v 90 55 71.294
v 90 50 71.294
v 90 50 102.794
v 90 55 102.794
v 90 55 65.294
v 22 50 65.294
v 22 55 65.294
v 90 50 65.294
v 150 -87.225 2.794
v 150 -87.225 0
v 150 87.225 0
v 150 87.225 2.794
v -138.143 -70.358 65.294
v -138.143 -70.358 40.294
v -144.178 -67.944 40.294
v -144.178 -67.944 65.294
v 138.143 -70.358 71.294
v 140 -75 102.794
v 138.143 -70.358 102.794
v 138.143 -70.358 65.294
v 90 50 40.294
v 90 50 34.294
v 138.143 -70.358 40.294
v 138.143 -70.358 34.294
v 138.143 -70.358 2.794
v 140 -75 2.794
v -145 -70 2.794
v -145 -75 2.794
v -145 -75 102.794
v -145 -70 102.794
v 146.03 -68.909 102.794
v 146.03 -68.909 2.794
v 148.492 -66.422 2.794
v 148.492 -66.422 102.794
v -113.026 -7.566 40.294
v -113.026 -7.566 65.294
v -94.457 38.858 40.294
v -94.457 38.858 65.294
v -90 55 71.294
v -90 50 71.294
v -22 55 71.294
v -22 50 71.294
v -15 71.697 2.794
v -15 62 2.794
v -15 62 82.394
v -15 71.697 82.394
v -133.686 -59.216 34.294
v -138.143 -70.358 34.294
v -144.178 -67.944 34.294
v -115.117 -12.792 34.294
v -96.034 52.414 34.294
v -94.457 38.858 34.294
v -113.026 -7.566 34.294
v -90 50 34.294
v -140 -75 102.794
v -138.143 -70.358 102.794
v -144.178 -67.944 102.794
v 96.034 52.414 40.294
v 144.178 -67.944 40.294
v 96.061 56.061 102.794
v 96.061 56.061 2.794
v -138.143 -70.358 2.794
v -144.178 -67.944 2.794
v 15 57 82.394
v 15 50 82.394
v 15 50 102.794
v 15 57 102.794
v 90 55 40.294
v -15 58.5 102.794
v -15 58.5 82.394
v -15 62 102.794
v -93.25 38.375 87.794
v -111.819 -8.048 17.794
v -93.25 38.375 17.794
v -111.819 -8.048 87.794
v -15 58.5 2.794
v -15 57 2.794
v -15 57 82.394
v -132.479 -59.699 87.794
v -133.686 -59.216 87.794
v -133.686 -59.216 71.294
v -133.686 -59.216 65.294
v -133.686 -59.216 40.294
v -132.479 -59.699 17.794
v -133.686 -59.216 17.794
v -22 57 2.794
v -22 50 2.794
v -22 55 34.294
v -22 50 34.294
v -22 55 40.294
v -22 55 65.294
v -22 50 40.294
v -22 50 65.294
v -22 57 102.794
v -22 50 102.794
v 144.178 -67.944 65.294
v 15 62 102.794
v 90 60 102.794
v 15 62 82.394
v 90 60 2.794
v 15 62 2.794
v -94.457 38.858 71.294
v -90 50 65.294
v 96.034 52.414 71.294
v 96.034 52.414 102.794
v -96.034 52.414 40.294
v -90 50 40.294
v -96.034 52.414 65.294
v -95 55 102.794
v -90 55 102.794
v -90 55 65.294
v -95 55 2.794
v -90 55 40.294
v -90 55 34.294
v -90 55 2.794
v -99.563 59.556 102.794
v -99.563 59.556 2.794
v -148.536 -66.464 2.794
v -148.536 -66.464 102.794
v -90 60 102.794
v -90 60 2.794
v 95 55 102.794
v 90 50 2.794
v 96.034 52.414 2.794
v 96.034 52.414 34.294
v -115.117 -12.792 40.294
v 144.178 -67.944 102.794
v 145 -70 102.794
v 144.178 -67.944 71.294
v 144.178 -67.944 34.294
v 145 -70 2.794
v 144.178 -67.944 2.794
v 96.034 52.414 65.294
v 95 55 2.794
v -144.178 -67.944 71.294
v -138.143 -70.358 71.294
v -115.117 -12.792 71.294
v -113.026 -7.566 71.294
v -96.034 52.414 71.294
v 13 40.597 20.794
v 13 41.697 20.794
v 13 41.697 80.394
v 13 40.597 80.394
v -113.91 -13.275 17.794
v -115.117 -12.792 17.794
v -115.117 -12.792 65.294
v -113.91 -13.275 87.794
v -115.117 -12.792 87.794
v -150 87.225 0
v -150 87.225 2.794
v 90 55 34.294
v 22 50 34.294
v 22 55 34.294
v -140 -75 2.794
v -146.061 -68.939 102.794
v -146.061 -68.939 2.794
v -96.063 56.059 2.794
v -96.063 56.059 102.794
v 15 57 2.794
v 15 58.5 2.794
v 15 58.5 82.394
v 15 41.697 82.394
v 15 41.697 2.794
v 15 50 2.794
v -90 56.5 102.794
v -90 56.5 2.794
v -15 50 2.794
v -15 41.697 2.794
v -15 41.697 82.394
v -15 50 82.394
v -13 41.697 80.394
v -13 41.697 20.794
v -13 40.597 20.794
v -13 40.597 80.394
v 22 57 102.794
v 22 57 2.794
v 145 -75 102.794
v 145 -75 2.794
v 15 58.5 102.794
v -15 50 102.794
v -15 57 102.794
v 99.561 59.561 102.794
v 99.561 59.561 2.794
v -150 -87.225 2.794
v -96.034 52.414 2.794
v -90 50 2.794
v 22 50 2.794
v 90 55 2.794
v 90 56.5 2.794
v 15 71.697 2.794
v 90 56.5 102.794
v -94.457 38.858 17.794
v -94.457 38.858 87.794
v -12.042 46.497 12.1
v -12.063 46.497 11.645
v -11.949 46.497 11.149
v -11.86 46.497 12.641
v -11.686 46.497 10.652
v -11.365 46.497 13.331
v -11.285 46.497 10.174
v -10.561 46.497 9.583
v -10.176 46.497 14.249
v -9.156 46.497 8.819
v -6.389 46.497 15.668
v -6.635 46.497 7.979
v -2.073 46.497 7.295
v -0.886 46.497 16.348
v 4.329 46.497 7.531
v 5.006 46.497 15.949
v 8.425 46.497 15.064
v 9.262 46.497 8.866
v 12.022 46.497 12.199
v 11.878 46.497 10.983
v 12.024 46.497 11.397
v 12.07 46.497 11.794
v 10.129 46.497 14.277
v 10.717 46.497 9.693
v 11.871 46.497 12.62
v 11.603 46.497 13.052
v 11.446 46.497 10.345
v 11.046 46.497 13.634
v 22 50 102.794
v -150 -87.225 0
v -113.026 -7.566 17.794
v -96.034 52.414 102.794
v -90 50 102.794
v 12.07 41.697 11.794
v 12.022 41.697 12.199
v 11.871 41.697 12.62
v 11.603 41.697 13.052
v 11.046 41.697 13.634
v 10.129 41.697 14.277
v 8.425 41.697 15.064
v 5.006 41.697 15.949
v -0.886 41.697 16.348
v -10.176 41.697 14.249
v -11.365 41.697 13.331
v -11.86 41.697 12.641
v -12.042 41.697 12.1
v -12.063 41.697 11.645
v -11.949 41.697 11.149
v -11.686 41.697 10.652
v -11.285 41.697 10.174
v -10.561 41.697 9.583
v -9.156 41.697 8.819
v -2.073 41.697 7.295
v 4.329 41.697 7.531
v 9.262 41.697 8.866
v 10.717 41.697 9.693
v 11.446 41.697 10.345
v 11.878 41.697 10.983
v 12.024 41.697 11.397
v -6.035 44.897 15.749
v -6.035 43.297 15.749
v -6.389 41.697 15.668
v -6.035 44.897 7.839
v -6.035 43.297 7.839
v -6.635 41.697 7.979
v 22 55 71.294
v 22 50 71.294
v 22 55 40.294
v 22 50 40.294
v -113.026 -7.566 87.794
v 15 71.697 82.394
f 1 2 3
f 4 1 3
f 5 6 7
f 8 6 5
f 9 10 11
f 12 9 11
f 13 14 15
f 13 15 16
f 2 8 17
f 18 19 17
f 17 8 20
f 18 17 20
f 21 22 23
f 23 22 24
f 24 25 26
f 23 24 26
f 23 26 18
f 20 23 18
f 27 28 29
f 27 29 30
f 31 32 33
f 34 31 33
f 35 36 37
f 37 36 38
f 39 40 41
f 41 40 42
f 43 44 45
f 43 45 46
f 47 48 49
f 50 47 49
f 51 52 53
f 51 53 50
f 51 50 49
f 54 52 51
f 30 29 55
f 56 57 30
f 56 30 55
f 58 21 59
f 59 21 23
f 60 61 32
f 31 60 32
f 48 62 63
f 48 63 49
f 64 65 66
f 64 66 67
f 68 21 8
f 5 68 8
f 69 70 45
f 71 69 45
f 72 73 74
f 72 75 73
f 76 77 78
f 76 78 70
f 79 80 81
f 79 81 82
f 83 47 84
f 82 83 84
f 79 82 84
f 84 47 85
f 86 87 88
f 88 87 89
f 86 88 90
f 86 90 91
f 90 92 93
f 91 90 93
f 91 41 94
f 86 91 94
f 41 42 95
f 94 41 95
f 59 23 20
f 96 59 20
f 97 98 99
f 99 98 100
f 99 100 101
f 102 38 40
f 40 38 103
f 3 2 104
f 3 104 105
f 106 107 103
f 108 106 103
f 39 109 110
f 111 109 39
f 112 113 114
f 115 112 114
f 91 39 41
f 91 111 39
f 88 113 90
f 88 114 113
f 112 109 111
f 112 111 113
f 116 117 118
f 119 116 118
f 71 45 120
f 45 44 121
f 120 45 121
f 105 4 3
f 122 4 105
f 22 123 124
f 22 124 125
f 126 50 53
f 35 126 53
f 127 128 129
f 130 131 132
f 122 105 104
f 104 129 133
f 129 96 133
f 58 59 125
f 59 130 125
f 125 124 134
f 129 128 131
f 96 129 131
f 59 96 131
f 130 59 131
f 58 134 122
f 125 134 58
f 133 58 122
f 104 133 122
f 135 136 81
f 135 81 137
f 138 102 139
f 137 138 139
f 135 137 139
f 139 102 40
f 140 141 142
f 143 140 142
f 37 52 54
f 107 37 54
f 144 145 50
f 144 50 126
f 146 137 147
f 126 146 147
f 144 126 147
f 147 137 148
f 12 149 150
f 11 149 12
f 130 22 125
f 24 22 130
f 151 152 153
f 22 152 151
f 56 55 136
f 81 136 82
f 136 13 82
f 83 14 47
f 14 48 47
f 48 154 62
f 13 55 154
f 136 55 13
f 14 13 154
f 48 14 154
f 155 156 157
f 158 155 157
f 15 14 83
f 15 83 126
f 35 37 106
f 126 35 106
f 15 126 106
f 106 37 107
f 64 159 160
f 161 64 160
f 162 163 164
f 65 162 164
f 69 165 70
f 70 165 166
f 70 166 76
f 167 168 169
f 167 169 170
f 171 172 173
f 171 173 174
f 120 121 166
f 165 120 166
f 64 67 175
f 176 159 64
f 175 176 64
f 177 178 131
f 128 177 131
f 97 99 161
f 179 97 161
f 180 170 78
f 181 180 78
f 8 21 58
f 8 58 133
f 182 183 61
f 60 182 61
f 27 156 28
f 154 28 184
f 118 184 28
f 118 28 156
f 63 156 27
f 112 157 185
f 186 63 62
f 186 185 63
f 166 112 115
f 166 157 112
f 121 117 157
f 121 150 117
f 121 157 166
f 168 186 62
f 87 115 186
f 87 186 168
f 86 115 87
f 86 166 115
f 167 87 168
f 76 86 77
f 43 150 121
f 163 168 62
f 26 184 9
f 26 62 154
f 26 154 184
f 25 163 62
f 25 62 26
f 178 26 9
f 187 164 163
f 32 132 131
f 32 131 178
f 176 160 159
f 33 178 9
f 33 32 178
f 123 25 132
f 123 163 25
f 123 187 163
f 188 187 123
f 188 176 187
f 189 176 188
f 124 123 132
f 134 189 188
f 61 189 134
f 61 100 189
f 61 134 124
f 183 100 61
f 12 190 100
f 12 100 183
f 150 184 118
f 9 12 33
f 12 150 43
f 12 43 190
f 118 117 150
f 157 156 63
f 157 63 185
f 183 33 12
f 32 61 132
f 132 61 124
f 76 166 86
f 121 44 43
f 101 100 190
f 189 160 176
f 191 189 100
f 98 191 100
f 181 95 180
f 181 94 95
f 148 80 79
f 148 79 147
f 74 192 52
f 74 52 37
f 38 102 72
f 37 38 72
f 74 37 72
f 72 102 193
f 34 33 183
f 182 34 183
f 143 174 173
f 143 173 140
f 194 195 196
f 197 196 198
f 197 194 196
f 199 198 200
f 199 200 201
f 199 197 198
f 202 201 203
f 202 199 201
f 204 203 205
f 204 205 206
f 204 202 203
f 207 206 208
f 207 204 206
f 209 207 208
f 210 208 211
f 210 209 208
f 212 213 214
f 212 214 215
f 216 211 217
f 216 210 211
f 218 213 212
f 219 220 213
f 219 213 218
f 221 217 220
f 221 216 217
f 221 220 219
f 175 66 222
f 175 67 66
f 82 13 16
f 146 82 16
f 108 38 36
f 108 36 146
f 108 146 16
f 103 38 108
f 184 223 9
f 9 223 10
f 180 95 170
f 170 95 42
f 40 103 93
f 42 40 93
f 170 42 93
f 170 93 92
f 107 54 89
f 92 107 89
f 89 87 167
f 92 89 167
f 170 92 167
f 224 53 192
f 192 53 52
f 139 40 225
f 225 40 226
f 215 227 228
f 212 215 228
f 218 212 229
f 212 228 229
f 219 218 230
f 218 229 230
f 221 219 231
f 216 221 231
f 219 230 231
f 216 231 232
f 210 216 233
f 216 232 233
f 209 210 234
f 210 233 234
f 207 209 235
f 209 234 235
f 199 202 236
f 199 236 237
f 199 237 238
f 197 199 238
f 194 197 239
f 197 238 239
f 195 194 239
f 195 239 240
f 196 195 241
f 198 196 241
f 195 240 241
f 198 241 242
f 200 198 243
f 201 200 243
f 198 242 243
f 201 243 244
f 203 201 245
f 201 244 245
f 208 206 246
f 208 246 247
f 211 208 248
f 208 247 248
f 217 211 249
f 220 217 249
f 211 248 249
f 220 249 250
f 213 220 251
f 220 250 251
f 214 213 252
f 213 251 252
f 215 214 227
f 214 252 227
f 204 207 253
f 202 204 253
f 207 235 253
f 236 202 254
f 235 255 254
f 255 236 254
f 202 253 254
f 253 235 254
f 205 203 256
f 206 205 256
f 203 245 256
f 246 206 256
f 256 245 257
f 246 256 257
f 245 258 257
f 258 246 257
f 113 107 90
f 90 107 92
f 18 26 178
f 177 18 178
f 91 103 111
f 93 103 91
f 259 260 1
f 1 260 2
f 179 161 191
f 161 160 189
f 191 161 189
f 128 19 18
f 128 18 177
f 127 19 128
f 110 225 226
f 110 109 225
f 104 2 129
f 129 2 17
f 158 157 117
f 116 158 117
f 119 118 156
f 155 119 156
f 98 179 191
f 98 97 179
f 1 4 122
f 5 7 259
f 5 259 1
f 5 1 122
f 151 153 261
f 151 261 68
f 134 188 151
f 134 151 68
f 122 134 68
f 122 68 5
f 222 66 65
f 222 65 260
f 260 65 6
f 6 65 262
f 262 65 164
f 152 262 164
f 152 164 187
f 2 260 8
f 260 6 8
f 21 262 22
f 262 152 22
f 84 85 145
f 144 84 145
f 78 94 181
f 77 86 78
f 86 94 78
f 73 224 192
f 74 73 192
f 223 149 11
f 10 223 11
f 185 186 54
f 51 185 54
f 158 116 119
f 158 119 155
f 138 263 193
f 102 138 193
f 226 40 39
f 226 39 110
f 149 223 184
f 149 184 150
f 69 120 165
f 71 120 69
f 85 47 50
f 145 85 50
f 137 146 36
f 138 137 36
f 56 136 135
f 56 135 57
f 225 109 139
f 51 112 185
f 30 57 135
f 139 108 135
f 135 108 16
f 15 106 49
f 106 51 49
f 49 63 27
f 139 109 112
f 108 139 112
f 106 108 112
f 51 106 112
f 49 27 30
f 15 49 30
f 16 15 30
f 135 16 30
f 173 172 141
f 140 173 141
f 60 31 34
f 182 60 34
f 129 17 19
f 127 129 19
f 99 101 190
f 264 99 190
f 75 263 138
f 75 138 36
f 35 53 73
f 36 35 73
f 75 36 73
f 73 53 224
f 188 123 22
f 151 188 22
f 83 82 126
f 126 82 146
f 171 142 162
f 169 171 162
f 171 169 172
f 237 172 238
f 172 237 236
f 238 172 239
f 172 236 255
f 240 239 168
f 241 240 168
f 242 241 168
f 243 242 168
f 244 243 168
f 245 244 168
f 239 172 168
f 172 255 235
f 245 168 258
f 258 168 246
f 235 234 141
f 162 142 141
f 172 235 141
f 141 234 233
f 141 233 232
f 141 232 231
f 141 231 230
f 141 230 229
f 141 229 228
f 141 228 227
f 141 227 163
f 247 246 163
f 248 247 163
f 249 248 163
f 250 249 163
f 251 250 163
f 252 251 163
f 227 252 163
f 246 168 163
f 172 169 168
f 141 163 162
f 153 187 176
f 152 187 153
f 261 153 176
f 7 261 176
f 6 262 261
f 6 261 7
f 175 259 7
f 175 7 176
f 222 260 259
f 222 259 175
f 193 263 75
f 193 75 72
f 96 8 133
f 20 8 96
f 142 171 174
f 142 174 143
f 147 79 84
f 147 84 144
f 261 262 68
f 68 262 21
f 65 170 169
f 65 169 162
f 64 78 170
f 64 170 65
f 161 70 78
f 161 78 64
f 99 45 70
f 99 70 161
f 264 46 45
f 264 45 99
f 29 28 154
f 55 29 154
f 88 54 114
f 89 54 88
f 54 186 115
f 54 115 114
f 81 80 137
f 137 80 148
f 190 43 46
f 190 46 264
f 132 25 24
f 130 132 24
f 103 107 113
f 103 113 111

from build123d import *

# Parameters (mm, degrees)
F0_W      = 300
F0_H      = 174.4493450305
F1_DEPTH  = 2.794
F2_W      = 5
F2_H      = 5
F2_W_2    = 7
F2_H_2    = 7
F3_DEPTH  = 100
F4_W      = 30
F4_H      = 30
F5_DEPTH  = 79.6
F6_W      = 26
F6_H      = 59.6
F7_DEPTH  = 1.1
F9_DEPTH  = 4.8
F11_DEPTH = 100
F12_W     = 68
F12_H     = 5
F13_DEPTH = 100
F14_W     = 68
F14_H     = 5
F15_DEPTH = 100
F17_DEPTH = 100
F18_W     = 129.6291201784
F18_H     = 31.5
F18_H_2   = 25
F19_DEPTH = 16.5
F20_W     = 68
F20_H     = 31.5
F20_H_2   = 25
F21_DEPTH = 25
F22_W     = 68
F22_H     = 31.5
F22_H_2   = 25
F23_DEPTH = 25
F24_W     = 129.6291201784
F24_H     = 31.5
F24_H_2   = 25
F25_DEPTH = 25
F26_DEPTH = 100
F27_W     = 50
F27_H     = 16.5
F27_H_2   = 25
F27_H_3   = 6
F28_DEPTH = 1.3


with BuildPart() as f1:
    # F0 (on Top) → F1 (new body)
    with BuildSketch(Plane.XY):
        Rectangle(F0_W, F0_H)
    extrude(amount=F1_DEPTH)

    # F2 (on face) → F3 (join)
    with BuildSketch(Plane.XY.offset(2.794)):
        with Locations((-142.5, -72.5)):
            Rectangle(F2_W, F2_H)
        with Locations((-92.5, 52.5)):
            Rectangle(F2_W, F2_H)
        with Locations((92.5, 52.5)):
            Rectangle(F2_W, F2_H)
        with Locations((142.5, -72.5)):
            Rectangle(F2_W, F2_H)
        with Locations((-18.5, 53.5)):
            Rectangle(F2_W_2, F2_H_2)
        with Locations((18.5, 53.5)):
            Rectangle(F2_W_2, F2_H_2)
        Polygon((-90, 60), (-90, 56.5), (-15, 58.5), (-15, 62), align=None)
        Polygon((90, 60), (15, 62), (15, 58.5), (90, 56.5), align=None)
        Polygon((96.0606601718, 56.0606601718), (146.02977278, -68.9093268035), (148.4921801752, -66.4220492114), (99.5606601718, 59.5606601718), align=None)
        Polygon((-96.0627255066, 56.0585908075), (-99.5627255066, 59.5562038535), (-148.5355339059, -66.4644660941), (-146.0606601718, -68.9393398282), align=None)
    extrude(amount=F3_DEPTH)

    # F4 (on face) → F5 (join)
    with BuildSketch(Plane.XY.offset(2.794)):
        with Locations((0, 56.6965335608)):
            Rectangle(F4_W, F4_H)
    extrude(amount=F5_DEPTH)

    # F6 (on face) → F7 (join)
    with BuildSketch(Plane.XZ.offset(-41.6965335608)):
        with Locations((0, 50.594)):
            Rectangle(F6_W, F6_H)
    extrude(amount=F7_DEPTH)

    # F8 (on face) → F9 (cut)
    with BuildSketch(Plane.XZ.offset(-41.6965335608)):
        with BuildLine():
            add(Edge.make_bspline(
                [(12.06954394, 11.794), (12.06954394, 19.7033991149), (-6.03477197, 15.7486995575), (-24.13908788, 11.794), (-6.03477197, 7.8393004425), (12.06954394, 3.8846008851), (12.06954394, 11.794)],
                knots=[0, 0, 0, 2.0943951024, 2.0943951024, 4.1887902048, 4.1887902048, 6.2831853072, 6.2831853072, 6.2831853072], degree=2, weights=[1, 0.5, 1, 0.5, 1, 0.5, 1]))
        make_face()
    extrude(amount=-F9_DEPTH, mode=Mode.SUBTRACT)

    # F10 (on face) → F11 (join)
    with BuildSketch(Plane.XY.offset(2.794)):
        Polygon((-140, -70), (-140, -75), (-90, 50), (-95, 50), (-95, 55), (-145, -70), align=None)
    extrude(amount=F11_DEPTH)

    # F12 (on face) → F13 (join)
    with BuildSketch(Plane.XY.offset(2.794)):
        with Locations((-56, 52.5)):
            Rectangle(F12_W, F12_H)
    extrude(amount=F13_DEPTH)

    # F14 (on face) → F15 (join)
    with BuildSketch(Plane.XY.offset(2.794)):
        with Locations((56, 52.5)):
            Rectangle(F14_W, F14_H)
    extrude(amount=F15_DEPTH)

    # F16 (on face) → F17 (join)
    with BuildSketch(Plane.XY.offset(2.794)):
        Polygon((90, 50), (140, -75), (140, -70), (145, -70), (95, 55), (95, 50), align=None)
    extrude(amount=F17_DEPTH)

    # F18 (on face) → F19 (cut)
    with BuildSketch(Plane(origin=(-94.8275862069, 37.9310344828, 0), x_dir=(0.3713906764, 0.9284766909, 0), z_dir=(0.9284766909, -0.3713906764, 0))):
        with Locations((-51.8158864168, 87.044)):
            Rectangle(F18_W, F18_H)
        with Locations((-51.8158864168, 52.794)):
            Rectangle(F18_W, F18_H_2)
        with Locations((-51.8158864168, 18.544)):
            Rectangle(F18_W, F18_H)
    extrude(amount=-F19_DEPTH, mode=Mode.SUBTRACT)

    # F20 (on face) → F21 (cut)
    with BuildSketch(Plane.XZ.offset(-50)):
        with Locations((-56, 87.044)):
            Rectangle(F20_W, F20_H)
        with Locations((-56, 52.794)):
            Rectangle(F20_W, F20_H_2)
        with Locations((-56, 18.544)):
            Rectangle(F20_W, F20_H)
    extrude(amount=-F21_DEPTH, mode=Mode.SUBTRACT)

    # F22 (on face) → F23 (cut)
    with BuildSketch(Plane.XZ.offset(-50)):
        with Locations((56, 18.544)):
            Rectangle(F22_W, F22_H)
        with Locations((56, 52.794)):
            Rectangle(F22_W, F22_H_2)
        with Locations((56, 87.044)):
            Rectangle(F22_W, F22_H)
    extrude(amount=-F23_DEPTH, mode=Mode.SUBTRACT)

    # F24 (on face) → F25 (cut)
    with BuildSketch(Plane(origin=(94.8275862069, 37.9310344828, 0), x_dir=(0.3713906764, -0.9284766909, 0), z_dir=(-0.9284766909, -0.3713906764, 0))):
        with Locations((51.8158864168, 87.044)):
            Rectangle(F24_W, F24_H)
        with Locations((51.8158864168, 52.794)):
            Rectangle(F24_W, F24_H_2)
        with Locations((51.8158864168, 18.544)):
            Rectangle(F24_W, F24_H)
    extrude(amount=-F25_DEPTH, mode=Mode.SUBTRACT)

    # F2 (on face) → F26 (join)
    with BuildSketch(Plane.XY.offset(2.794)):
        Polygon((-96.0627255066, 56.0585908075), (-99.5627255066, 59.5562038535), (-148.5355339059, -66.4644660941), (-146.0606601718, -68.9393398282), align=None)
        Polygon((-90, 60), (-90, 56.5), (-15, 58.5), (-15, 62), align=None)
        Polygon((90, 60), (15, 62), (15, 58.5), (90, 56.5), align=None)
        Polygon((96.0606601718, 56.0606601718), (146.02977278, -68.9093268035), (148.4921801752, -66.4220492114), (99.5606601718, 59.5606601718), align=None)
    extrude(amount=F26_DEPTH)

    # F27 (on face) → F28 (join)
    with BuildSketch(Plane(origin=(-94.8275862069, 37.9310344828, 0), x_dir=(0.3713906764, 0.9284766909, 0), z_dir=(0.9284766909, -0.3713906764, 0))):
        with Locations((-79.630446506, 79.544)):
            Rectangle(F27_W, F27_H)
        with Locations((-79.630446506, 52.794)):
            Rectangle(F27_W, F27_H_2)
        with Locations((-79.630446506, 68.294)):
            Rectangle(F27_W, F27_H_3)
        with Locations((-79.630446506, 26.044)):
            Rectangle(F27_W, F27_H)
        with Locations((-79.630446506, 37.294)):
            Rectangle(F27_W, F27_H_3)
        with Locations((-24.0013263276, 26.044)):
            Rectangle(F27_W, F27_H)
        with Locations((-24.0013263276, 37.294)):
            Rectangle(F27_W, F27_H_3)
        with Locations((-24.0013263276, 52.794)):
            Rectangle(F27_W, F27_H_2)
        with Locations((-24.0013263276, 68.294)):
            Rectangle(F27_W, F27_H_3)
        with Locations((-24.0013263276, 79.544)):
            Rectangle(F27_W, F27_H)
    extrude(amount=F28_DEPTH)


solid = f1.part
